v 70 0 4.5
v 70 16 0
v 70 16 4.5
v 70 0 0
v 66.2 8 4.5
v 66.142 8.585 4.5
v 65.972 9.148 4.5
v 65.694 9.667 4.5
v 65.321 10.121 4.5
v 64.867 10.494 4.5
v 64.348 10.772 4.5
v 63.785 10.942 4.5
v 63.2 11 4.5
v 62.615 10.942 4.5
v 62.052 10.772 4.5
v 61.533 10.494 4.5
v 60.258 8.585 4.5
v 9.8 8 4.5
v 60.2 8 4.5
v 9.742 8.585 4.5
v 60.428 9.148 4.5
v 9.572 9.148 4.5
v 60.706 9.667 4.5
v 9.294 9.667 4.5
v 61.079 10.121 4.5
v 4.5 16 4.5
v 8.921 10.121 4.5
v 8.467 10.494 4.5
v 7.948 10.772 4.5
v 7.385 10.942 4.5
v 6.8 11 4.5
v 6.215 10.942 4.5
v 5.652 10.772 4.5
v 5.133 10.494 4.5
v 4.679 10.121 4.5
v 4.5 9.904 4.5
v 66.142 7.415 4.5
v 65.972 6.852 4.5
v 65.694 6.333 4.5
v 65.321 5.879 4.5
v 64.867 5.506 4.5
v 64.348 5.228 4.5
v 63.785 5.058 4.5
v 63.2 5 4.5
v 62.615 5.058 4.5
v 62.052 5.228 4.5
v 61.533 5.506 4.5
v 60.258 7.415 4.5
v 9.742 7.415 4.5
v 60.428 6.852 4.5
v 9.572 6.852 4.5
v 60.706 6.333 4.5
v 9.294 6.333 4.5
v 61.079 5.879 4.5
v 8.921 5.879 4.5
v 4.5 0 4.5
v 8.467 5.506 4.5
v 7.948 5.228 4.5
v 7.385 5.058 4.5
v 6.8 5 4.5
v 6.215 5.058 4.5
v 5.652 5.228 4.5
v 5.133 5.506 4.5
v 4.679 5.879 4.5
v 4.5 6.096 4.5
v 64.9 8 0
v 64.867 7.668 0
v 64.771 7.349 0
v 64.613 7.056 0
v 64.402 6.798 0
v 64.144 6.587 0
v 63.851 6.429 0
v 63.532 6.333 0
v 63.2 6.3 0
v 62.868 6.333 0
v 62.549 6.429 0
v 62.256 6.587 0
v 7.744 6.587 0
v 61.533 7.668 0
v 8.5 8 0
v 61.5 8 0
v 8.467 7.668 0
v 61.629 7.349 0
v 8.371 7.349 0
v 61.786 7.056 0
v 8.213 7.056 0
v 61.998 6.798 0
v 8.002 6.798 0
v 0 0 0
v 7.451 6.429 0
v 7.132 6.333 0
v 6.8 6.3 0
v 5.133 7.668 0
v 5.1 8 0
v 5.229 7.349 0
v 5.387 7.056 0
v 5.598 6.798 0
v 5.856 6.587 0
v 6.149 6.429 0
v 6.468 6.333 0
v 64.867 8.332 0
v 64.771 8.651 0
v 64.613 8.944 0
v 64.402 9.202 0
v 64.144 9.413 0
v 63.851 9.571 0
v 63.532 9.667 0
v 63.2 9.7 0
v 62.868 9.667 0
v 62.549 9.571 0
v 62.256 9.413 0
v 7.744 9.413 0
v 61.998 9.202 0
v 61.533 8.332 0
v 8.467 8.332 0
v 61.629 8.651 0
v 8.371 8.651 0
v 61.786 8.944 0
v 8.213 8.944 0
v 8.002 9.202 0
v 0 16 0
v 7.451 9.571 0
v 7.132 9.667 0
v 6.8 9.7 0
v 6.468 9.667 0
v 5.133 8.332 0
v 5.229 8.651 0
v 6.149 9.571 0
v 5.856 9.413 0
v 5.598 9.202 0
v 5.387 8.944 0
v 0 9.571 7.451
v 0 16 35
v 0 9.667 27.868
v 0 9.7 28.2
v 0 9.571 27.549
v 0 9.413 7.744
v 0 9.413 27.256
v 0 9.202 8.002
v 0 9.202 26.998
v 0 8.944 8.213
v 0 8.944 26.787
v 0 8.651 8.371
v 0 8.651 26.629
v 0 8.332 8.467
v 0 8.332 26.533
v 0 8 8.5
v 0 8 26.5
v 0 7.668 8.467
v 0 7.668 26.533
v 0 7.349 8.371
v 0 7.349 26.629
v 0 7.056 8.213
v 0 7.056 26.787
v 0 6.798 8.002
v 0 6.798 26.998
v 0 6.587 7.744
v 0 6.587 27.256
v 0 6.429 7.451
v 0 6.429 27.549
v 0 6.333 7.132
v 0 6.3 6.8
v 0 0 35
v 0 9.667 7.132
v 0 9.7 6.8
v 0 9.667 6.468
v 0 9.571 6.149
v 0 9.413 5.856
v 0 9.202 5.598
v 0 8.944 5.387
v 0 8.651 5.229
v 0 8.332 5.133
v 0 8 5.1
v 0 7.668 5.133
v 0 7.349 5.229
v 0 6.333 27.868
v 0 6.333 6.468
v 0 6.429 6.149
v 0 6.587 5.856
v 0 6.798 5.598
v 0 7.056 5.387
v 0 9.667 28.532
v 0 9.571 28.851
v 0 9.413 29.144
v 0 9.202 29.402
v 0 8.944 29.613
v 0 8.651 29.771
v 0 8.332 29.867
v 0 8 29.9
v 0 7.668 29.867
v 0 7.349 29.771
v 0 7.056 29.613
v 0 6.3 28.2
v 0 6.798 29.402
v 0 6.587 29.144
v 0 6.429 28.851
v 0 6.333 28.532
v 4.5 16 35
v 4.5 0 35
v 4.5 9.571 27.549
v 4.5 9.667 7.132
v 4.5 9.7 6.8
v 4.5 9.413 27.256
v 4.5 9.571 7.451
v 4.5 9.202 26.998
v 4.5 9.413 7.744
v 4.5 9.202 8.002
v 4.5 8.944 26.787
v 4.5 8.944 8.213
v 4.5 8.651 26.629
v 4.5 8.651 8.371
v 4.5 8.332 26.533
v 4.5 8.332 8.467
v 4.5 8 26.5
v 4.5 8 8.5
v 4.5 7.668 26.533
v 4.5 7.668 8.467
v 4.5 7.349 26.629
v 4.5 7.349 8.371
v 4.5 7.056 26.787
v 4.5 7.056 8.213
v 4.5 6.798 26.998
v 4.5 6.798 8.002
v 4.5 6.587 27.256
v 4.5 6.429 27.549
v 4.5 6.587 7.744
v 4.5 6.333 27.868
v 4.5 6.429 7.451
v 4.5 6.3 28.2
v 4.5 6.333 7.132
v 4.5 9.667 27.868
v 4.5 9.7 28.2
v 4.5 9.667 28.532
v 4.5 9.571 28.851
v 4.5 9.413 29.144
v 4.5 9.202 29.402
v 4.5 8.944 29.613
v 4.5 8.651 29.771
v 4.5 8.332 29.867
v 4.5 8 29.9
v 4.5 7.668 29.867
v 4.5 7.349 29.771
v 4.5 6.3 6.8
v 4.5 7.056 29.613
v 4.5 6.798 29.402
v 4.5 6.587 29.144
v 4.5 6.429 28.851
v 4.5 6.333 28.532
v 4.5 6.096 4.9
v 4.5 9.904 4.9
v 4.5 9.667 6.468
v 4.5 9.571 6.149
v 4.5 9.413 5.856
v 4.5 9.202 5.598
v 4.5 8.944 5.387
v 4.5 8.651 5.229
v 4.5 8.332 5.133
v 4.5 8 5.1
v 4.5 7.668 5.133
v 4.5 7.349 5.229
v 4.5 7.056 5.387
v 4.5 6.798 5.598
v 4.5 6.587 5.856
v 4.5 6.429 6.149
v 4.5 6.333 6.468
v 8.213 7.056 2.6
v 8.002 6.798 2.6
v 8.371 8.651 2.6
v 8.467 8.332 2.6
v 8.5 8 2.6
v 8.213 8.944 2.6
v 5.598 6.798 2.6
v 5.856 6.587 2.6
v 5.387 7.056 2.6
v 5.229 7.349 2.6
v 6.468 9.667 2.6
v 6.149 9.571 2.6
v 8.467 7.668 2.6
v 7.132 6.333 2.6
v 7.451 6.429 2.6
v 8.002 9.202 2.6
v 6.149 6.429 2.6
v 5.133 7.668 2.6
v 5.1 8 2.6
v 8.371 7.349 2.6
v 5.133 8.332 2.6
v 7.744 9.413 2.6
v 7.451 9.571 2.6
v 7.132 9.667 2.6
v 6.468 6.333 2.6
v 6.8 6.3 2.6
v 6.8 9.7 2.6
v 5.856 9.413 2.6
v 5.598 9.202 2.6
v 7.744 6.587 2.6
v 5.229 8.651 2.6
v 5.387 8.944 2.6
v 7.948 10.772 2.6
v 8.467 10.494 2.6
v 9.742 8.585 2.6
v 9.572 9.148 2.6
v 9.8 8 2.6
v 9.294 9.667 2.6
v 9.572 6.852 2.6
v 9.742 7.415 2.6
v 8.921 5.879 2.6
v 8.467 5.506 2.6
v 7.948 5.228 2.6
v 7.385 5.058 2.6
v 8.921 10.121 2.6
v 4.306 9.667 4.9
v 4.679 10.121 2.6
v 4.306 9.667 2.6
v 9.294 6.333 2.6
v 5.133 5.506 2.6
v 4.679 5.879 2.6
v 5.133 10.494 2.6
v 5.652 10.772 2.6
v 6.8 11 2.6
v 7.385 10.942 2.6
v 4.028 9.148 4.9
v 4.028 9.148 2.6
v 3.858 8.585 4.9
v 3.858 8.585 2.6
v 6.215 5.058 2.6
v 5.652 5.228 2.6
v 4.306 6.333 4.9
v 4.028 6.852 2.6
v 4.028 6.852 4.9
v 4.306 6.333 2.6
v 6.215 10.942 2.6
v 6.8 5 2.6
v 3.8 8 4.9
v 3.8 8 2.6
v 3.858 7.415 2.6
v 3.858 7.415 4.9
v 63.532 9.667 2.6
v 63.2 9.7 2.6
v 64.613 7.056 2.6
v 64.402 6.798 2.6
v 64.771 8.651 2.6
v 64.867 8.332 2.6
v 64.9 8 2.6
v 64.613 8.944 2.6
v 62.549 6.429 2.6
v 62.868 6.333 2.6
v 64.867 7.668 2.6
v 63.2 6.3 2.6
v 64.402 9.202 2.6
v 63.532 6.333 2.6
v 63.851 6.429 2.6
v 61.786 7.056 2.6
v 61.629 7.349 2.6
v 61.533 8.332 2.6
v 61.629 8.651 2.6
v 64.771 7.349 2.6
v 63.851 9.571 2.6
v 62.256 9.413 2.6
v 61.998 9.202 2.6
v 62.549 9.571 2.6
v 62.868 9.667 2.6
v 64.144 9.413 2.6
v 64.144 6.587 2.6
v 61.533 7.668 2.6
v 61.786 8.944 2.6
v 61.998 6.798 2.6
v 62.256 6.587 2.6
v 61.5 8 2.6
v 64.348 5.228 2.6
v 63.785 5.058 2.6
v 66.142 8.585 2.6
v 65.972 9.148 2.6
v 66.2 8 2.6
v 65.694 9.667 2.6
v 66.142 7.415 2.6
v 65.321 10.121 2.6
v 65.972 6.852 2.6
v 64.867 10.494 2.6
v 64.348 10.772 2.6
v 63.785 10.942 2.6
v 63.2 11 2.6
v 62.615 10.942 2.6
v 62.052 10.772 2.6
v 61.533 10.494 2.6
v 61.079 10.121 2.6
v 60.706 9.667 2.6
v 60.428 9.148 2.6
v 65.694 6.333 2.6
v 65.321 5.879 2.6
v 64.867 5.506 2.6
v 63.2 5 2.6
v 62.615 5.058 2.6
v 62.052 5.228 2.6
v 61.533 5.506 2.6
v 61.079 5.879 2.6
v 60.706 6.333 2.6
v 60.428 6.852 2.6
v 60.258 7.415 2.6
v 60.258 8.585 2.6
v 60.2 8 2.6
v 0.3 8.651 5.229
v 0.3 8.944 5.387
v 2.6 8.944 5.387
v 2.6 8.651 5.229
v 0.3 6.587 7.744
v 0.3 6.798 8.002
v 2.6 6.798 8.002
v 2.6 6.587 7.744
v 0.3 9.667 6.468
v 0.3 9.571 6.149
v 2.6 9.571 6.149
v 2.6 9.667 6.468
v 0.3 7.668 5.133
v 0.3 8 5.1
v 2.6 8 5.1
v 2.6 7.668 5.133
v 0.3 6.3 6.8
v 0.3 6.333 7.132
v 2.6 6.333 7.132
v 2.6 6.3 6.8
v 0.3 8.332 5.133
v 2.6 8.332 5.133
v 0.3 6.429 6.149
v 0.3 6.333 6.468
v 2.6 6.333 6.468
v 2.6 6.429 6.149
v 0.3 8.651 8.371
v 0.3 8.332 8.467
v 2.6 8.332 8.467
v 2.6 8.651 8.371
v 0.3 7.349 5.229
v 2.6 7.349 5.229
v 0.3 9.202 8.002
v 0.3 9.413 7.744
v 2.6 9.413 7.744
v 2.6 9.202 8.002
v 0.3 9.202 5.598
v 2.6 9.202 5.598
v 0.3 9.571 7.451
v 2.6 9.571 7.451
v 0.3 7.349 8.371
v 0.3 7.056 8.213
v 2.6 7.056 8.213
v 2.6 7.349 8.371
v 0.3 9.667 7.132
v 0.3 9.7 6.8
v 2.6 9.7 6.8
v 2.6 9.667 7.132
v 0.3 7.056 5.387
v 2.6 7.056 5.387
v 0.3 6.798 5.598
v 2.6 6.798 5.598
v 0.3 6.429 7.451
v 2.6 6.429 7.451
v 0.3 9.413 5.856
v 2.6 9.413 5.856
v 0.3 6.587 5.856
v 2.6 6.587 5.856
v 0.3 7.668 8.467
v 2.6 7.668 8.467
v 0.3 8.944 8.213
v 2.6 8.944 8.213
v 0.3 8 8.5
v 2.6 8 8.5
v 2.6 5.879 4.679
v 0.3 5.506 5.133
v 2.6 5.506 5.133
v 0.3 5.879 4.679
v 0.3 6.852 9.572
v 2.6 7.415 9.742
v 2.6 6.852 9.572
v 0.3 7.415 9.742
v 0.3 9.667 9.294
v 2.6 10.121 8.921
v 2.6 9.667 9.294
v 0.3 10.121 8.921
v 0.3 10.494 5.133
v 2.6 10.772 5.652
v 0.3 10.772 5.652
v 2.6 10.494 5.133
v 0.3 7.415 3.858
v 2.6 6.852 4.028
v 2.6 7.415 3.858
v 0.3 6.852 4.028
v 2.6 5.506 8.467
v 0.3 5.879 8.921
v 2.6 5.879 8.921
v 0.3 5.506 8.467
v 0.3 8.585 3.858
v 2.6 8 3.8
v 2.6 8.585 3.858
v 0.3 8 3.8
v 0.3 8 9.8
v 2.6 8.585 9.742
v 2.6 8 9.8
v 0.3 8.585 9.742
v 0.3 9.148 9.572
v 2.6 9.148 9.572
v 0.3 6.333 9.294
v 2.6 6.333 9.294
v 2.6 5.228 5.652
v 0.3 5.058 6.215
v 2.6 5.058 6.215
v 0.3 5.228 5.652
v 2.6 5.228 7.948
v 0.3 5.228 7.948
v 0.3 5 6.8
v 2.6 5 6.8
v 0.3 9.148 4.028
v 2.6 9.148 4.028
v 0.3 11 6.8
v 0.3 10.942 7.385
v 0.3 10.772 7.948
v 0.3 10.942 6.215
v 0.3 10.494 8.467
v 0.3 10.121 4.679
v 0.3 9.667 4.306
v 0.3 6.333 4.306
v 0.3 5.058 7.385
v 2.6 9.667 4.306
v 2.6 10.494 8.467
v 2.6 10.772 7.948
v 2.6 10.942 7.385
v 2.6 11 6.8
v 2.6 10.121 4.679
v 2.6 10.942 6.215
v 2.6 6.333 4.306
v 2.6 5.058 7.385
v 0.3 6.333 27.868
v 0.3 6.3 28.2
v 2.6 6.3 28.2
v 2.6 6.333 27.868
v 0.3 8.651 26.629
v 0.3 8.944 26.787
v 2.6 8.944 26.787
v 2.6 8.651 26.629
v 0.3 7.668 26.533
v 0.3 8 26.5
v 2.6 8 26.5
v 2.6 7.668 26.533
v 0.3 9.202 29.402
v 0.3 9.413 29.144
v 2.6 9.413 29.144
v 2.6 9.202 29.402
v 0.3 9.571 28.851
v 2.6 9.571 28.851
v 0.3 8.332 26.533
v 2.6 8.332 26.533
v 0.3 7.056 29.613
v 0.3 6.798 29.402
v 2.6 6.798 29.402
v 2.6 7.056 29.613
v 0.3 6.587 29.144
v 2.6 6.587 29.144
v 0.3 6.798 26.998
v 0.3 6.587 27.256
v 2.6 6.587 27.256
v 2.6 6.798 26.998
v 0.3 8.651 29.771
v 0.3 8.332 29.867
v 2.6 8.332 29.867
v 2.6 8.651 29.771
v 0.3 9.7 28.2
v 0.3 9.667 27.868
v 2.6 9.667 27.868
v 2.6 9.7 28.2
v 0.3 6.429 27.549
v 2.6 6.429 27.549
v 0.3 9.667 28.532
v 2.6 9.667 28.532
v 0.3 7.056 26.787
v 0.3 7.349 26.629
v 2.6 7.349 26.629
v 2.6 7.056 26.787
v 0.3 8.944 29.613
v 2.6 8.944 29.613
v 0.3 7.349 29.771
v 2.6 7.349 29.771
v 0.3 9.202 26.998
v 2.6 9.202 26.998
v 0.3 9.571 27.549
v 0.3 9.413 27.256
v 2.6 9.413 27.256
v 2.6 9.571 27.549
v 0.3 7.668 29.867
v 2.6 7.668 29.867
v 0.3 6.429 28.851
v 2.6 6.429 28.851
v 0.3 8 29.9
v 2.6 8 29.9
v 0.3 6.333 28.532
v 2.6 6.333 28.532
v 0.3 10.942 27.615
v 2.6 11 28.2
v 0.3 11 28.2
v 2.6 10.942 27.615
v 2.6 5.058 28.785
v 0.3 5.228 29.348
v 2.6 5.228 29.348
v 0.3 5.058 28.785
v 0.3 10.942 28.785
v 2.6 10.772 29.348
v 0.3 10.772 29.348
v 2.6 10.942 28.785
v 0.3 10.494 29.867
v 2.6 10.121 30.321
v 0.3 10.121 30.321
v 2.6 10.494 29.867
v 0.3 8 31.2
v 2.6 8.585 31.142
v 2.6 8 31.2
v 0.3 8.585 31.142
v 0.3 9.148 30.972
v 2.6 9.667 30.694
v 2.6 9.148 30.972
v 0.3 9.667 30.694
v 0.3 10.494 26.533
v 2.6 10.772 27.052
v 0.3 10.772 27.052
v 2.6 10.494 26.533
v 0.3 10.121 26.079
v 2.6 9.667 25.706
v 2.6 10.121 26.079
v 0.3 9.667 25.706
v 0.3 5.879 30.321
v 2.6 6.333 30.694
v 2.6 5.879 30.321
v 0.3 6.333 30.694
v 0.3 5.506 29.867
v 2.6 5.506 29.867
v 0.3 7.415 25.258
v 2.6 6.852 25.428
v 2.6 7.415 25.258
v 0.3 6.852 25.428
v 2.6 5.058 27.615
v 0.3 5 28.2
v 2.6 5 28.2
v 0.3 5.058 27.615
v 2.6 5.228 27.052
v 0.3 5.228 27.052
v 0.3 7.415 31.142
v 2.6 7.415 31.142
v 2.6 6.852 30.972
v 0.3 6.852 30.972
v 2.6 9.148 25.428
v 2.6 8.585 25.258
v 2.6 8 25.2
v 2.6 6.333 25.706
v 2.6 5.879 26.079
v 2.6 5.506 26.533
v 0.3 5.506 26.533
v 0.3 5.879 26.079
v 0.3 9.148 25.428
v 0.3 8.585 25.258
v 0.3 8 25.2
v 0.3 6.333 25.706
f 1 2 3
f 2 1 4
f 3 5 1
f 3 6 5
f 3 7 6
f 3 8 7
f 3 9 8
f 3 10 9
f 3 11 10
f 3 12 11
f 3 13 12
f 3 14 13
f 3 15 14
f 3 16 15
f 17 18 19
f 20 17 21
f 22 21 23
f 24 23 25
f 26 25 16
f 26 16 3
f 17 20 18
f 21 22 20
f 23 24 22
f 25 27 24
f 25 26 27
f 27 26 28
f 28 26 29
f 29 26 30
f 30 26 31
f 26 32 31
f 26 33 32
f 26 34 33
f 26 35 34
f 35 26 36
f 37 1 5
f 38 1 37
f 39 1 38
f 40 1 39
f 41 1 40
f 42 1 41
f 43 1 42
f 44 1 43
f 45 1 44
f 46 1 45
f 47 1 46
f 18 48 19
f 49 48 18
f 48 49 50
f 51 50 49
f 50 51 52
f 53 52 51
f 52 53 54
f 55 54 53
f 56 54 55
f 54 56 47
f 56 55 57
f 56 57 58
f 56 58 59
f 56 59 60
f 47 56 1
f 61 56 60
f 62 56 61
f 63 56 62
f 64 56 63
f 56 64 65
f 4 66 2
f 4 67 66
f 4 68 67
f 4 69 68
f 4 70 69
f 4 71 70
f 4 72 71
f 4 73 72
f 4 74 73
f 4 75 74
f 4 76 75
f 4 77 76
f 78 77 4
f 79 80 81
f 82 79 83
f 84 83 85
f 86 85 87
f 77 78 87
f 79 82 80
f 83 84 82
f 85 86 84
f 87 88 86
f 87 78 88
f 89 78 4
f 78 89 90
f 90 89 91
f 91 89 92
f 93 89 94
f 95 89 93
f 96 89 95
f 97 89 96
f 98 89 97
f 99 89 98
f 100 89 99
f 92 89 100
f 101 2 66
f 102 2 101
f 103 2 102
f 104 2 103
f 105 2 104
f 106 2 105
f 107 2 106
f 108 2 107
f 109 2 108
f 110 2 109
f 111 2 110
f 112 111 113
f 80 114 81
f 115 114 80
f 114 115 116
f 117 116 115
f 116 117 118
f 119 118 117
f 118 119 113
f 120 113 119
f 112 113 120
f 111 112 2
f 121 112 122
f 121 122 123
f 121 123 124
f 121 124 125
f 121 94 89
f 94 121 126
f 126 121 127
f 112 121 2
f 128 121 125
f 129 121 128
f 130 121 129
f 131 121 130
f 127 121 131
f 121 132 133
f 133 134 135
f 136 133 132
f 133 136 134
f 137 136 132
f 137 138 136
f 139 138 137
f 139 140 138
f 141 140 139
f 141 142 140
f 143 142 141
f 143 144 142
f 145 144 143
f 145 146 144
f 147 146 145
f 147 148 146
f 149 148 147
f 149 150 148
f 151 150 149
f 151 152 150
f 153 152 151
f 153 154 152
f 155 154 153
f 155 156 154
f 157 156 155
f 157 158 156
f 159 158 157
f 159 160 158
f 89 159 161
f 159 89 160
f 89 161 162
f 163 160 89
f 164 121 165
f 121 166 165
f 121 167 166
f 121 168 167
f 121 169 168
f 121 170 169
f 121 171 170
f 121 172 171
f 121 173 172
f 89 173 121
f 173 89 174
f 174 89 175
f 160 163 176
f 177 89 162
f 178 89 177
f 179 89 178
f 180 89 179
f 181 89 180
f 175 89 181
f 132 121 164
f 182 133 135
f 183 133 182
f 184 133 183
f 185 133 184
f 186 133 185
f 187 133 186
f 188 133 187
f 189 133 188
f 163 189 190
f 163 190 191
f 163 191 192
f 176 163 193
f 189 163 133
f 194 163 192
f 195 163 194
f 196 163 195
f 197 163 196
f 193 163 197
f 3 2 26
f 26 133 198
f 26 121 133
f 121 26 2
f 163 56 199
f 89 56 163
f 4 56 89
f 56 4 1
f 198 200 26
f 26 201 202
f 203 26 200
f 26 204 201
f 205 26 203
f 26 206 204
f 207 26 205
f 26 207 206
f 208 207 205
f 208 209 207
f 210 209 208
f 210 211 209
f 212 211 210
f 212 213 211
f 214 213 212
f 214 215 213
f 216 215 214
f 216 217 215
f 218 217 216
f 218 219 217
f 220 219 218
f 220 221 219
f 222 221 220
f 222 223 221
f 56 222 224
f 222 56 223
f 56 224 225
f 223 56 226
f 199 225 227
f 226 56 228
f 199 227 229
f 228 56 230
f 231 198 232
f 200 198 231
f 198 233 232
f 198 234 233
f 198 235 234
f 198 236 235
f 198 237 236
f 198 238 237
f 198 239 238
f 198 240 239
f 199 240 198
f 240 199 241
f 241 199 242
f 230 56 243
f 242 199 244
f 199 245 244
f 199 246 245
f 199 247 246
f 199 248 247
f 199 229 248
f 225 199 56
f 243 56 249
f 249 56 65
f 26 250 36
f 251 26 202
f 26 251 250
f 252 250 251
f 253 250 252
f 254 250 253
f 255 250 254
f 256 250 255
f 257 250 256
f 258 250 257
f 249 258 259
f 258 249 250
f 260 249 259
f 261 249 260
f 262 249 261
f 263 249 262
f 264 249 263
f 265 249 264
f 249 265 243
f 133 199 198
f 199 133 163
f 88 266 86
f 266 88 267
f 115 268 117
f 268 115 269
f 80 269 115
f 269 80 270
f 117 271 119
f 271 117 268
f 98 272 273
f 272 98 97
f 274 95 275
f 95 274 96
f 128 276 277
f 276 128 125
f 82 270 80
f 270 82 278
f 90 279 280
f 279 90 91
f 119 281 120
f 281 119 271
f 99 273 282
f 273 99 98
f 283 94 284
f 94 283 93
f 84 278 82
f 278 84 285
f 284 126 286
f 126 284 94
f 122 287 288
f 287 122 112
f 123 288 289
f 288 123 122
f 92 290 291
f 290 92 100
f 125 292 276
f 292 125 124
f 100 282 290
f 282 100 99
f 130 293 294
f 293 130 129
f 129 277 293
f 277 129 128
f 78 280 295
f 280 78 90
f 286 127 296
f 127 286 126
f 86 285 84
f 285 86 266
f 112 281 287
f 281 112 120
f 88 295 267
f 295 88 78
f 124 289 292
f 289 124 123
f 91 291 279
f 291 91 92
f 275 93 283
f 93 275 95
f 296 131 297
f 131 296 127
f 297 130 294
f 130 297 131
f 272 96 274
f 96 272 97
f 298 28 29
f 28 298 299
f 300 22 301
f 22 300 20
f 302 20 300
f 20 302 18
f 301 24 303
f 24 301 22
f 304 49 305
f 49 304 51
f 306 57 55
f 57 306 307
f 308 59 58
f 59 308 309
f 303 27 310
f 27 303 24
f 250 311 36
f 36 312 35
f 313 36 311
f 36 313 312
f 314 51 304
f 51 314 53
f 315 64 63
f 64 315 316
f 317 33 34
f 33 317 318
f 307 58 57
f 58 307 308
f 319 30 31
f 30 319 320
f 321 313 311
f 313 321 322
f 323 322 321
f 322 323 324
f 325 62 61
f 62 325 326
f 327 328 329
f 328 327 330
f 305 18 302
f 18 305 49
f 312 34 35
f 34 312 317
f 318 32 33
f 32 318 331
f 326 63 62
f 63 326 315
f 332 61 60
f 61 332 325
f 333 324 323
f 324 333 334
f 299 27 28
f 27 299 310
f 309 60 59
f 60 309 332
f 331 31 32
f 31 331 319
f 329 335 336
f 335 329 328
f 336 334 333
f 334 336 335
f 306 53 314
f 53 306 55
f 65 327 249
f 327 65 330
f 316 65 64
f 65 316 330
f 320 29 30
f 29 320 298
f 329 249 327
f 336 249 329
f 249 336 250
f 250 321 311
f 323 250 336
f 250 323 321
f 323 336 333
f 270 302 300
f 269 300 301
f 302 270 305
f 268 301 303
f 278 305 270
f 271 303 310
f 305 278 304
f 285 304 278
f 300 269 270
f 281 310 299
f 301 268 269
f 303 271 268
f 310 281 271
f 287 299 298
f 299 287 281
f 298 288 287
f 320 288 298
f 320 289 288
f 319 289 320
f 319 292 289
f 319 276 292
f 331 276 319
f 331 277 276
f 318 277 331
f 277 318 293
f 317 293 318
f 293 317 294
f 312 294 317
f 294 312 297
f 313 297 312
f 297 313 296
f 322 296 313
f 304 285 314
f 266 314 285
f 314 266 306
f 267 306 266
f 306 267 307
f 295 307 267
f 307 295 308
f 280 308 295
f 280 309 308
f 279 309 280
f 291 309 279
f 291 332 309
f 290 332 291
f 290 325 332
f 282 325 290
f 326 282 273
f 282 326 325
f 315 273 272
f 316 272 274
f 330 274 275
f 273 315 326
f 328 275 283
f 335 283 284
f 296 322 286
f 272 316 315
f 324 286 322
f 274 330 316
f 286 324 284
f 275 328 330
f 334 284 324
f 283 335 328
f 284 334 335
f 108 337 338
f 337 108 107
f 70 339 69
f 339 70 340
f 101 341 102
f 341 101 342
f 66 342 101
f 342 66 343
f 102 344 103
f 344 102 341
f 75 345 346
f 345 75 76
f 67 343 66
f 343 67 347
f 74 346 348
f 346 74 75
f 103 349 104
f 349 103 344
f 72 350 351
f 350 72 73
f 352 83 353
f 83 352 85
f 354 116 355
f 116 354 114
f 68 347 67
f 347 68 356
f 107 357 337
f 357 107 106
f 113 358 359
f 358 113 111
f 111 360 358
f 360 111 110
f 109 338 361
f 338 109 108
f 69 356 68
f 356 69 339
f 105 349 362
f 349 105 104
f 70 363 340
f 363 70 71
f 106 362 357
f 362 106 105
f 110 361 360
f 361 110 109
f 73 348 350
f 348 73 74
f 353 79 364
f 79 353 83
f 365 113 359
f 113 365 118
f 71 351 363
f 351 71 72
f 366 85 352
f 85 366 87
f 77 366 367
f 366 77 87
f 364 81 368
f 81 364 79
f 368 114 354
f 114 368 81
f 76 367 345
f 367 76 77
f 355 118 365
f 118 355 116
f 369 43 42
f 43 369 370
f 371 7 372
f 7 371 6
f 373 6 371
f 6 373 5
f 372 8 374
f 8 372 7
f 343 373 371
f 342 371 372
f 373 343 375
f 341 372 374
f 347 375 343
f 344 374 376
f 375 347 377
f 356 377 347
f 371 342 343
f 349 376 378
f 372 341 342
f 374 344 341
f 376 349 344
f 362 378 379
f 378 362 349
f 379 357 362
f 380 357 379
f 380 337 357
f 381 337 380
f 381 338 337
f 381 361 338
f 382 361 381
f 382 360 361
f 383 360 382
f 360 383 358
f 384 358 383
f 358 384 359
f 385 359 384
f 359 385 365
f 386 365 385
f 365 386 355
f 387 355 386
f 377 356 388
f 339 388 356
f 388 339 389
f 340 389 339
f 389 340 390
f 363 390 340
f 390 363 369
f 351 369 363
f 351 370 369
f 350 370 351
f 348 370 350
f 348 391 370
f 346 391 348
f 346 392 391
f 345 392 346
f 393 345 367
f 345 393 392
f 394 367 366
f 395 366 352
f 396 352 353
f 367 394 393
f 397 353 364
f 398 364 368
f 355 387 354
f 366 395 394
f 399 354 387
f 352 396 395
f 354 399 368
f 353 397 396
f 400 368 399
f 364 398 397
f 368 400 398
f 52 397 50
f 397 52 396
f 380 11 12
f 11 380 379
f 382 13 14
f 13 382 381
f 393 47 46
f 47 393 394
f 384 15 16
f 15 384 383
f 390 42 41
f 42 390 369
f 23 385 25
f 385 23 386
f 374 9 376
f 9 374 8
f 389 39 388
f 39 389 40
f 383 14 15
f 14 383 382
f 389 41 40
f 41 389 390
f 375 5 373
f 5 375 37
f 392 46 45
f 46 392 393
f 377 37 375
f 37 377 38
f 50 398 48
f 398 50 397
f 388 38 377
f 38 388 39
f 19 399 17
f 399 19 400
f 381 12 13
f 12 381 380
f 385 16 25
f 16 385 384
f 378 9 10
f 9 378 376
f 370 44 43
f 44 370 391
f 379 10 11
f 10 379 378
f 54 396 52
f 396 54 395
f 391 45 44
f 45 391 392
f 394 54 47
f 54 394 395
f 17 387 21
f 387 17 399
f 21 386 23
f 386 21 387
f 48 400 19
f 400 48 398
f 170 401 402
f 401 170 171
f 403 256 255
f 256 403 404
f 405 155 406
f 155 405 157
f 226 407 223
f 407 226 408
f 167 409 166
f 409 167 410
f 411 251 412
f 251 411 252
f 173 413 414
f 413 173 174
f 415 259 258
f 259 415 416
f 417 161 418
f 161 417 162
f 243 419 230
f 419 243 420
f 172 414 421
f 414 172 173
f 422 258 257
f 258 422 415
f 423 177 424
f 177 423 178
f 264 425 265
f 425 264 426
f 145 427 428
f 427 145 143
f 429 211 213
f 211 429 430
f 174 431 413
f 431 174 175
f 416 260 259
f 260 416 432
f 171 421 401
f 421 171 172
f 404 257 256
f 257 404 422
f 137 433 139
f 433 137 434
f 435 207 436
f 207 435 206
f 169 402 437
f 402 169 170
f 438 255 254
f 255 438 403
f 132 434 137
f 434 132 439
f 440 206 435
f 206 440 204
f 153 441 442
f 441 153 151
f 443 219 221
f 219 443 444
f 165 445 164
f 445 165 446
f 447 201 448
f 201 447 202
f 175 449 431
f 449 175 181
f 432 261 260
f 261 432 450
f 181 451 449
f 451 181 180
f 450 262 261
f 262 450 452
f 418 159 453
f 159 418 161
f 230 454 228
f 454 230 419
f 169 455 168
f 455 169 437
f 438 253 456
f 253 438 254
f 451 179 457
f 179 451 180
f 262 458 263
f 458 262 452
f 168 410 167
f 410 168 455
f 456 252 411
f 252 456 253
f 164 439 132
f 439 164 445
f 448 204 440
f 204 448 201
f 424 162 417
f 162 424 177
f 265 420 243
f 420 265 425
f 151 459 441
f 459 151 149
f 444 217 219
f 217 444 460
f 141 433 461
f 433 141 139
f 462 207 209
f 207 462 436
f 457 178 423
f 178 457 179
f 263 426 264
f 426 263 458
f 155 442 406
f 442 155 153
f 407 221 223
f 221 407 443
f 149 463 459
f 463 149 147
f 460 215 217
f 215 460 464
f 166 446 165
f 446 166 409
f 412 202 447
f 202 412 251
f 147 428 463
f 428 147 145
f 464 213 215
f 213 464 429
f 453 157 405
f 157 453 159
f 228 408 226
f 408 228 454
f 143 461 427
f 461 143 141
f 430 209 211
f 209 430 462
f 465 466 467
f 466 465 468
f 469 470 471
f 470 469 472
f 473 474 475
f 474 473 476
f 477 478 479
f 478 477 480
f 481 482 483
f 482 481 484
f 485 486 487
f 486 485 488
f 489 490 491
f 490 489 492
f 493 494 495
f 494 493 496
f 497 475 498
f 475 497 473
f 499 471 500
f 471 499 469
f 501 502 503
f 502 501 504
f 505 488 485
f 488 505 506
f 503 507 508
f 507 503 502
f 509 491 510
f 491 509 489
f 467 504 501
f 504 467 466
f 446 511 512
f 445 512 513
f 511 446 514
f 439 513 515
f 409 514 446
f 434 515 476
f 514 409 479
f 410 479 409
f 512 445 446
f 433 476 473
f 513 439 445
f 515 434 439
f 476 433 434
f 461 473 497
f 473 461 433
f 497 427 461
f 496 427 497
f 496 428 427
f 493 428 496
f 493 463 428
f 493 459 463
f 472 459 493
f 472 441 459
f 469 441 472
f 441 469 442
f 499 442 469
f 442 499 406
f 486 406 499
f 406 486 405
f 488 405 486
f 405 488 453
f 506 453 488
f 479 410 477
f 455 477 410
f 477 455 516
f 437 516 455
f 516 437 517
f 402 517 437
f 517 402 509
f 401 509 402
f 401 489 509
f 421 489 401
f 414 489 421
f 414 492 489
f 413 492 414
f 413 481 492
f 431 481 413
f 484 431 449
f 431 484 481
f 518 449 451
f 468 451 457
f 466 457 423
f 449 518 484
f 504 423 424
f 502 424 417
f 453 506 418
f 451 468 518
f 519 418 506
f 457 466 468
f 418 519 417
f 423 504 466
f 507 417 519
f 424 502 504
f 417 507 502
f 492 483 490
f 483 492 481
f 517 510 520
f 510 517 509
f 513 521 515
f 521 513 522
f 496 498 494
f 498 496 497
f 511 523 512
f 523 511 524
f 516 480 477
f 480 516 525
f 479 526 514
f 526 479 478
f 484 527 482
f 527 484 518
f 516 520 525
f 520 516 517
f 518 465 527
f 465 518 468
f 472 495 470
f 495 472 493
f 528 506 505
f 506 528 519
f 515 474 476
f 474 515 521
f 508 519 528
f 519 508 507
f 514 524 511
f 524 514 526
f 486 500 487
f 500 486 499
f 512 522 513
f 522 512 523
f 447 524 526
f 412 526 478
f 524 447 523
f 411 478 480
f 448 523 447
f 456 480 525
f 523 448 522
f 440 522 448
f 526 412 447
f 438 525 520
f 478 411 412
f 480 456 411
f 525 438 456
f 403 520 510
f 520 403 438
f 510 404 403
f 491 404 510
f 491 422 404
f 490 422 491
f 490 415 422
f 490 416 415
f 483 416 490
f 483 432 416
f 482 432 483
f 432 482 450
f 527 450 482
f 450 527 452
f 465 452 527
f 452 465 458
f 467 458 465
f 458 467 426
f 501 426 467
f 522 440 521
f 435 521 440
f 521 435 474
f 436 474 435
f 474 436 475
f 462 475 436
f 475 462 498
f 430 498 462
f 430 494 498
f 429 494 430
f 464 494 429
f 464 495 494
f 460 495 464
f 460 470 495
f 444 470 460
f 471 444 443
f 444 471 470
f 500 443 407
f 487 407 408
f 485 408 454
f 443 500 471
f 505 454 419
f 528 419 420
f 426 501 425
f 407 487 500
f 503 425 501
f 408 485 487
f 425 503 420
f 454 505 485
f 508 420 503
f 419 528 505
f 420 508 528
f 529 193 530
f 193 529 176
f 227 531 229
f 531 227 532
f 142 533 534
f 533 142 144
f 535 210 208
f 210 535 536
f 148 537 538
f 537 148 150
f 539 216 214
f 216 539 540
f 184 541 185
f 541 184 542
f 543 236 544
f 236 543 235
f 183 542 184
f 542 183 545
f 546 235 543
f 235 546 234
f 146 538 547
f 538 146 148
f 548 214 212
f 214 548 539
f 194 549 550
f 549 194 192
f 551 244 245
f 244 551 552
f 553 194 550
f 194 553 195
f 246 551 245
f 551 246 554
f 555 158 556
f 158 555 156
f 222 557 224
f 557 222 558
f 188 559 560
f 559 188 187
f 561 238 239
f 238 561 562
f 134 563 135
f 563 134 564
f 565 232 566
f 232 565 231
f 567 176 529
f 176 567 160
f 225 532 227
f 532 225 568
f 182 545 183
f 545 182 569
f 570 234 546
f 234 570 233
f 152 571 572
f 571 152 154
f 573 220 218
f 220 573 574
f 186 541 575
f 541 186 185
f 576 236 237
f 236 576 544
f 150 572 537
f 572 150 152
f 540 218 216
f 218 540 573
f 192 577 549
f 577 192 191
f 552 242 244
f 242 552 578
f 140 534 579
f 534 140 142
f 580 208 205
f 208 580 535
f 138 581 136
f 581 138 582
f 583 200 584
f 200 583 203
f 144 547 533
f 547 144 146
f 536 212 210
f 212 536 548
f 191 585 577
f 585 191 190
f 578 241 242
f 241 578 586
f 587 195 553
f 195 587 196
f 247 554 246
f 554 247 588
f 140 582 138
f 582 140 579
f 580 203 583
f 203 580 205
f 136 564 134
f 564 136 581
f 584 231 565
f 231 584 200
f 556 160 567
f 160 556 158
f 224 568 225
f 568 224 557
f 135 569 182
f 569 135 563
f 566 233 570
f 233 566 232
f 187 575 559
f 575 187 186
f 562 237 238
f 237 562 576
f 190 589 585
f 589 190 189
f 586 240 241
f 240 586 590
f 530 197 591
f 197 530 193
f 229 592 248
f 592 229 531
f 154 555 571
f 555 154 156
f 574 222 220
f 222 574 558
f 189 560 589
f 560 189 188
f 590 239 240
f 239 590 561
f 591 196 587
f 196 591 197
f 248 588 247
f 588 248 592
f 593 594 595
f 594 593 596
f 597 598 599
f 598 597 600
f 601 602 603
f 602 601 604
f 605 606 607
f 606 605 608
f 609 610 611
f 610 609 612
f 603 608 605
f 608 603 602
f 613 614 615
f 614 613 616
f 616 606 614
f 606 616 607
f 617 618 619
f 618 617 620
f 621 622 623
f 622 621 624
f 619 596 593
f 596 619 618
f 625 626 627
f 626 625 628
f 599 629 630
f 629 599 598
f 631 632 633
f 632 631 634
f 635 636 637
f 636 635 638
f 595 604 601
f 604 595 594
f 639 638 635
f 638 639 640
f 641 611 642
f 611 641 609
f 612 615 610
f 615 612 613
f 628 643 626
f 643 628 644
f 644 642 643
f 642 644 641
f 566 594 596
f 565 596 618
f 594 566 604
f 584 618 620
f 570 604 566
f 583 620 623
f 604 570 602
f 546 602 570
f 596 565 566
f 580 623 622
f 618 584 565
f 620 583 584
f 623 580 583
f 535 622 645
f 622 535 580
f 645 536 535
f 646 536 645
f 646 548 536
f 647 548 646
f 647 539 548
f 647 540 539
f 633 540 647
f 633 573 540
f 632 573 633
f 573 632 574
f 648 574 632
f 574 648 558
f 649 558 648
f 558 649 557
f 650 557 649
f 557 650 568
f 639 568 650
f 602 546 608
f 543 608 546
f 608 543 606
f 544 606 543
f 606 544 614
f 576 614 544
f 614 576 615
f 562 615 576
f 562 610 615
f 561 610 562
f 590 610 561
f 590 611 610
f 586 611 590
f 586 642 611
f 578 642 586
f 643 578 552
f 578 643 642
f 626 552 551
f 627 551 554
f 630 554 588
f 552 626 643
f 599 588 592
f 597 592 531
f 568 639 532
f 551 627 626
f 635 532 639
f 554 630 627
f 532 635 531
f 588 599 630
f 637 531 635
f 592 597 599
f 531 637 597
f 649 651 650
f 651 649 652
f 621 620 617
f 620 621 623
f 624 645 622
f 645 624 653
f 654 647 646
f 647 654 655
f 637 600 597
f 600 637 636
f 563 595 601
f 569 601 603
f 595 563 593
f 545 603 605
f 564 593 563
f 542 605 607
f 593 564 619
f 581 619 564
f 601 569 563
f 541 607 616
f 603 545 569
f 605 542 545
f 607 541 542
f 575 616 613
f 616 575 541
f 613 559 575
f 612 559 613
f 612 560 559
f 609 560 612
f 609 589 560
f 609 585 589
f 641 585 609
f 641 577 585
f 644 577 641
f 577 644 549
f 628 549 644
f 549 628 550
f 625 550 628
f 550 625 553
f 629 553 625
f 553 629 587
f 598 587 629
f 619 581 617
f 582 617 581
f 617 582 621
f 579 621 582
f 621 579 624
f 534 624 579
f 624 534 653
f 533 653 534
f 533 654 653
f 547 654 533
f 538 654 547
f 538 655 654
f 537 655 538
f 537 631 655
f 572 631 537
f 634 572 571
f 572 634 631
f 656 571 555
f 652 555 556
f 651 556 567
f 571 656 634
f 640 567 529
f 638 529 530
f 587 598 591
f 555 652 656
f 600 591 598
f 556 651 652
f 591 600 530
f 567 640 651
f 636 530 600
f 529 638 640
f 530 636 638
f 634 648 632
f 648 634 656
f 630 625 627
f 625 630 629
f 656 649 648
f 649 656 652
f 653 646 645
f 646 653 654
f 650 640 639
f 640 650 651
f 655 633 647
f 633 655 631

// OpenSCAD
$fn = 32;

// ----------------------------------------------------------------------
// L-bracket: 70 x 16 x 35 mm
// ----------------------------------------------------------------------

// --- parameters (mm) ---
arm_x = 70;               // horizontal leg, X
arm_z = 35;               // vertical leg, Z
width = 16;               // bracket depth, Y
wall = 4.5;               // plate thickness
hole_d = 3.4;             // clearance for M3
cb_d = 6;                 // counterbore seat
cb_h = 1.9;               // counterbore depth

module hole_z(px, py) {
  translate([px, py, -2.5]) cylinder(h = wall + 5, d = hole_d);
}
module hole_x(pz, py) {
  translate([-2.5, py, pz]) rotate([0, 90, 0]) cylinder(h = wall + 5, d = hole_d);
}
module cb_z(px, py) {
  translate([px, py, wall - cb_h]) cylinder(h = cb_h + 0.4, d = cb_d);
}
module cb_x(pz, py) {
  translate([wall - cb_h, py, pz]) rotate([0, -90, 0]) cylinder(h = cb_h + 0.4, d = cb_d);
}

difference() {
  union() {
    /* horizontal leg */
    cube([arm_x, width, wall]);
    /* vertical leg, overlapping the corner block */
    cube([wall, width, arm_z]);
  }
  hole_z(6.8, 8);
  cb_z(6.8, 8);
  hole_z(63.2, 8);
  cb_z(63.2, 8);
  hole_x(6.8, 8);
  cb_x(6.8, 8);
  hole_x(28.2, 8);
  cb_x(28.2, 8);
}
